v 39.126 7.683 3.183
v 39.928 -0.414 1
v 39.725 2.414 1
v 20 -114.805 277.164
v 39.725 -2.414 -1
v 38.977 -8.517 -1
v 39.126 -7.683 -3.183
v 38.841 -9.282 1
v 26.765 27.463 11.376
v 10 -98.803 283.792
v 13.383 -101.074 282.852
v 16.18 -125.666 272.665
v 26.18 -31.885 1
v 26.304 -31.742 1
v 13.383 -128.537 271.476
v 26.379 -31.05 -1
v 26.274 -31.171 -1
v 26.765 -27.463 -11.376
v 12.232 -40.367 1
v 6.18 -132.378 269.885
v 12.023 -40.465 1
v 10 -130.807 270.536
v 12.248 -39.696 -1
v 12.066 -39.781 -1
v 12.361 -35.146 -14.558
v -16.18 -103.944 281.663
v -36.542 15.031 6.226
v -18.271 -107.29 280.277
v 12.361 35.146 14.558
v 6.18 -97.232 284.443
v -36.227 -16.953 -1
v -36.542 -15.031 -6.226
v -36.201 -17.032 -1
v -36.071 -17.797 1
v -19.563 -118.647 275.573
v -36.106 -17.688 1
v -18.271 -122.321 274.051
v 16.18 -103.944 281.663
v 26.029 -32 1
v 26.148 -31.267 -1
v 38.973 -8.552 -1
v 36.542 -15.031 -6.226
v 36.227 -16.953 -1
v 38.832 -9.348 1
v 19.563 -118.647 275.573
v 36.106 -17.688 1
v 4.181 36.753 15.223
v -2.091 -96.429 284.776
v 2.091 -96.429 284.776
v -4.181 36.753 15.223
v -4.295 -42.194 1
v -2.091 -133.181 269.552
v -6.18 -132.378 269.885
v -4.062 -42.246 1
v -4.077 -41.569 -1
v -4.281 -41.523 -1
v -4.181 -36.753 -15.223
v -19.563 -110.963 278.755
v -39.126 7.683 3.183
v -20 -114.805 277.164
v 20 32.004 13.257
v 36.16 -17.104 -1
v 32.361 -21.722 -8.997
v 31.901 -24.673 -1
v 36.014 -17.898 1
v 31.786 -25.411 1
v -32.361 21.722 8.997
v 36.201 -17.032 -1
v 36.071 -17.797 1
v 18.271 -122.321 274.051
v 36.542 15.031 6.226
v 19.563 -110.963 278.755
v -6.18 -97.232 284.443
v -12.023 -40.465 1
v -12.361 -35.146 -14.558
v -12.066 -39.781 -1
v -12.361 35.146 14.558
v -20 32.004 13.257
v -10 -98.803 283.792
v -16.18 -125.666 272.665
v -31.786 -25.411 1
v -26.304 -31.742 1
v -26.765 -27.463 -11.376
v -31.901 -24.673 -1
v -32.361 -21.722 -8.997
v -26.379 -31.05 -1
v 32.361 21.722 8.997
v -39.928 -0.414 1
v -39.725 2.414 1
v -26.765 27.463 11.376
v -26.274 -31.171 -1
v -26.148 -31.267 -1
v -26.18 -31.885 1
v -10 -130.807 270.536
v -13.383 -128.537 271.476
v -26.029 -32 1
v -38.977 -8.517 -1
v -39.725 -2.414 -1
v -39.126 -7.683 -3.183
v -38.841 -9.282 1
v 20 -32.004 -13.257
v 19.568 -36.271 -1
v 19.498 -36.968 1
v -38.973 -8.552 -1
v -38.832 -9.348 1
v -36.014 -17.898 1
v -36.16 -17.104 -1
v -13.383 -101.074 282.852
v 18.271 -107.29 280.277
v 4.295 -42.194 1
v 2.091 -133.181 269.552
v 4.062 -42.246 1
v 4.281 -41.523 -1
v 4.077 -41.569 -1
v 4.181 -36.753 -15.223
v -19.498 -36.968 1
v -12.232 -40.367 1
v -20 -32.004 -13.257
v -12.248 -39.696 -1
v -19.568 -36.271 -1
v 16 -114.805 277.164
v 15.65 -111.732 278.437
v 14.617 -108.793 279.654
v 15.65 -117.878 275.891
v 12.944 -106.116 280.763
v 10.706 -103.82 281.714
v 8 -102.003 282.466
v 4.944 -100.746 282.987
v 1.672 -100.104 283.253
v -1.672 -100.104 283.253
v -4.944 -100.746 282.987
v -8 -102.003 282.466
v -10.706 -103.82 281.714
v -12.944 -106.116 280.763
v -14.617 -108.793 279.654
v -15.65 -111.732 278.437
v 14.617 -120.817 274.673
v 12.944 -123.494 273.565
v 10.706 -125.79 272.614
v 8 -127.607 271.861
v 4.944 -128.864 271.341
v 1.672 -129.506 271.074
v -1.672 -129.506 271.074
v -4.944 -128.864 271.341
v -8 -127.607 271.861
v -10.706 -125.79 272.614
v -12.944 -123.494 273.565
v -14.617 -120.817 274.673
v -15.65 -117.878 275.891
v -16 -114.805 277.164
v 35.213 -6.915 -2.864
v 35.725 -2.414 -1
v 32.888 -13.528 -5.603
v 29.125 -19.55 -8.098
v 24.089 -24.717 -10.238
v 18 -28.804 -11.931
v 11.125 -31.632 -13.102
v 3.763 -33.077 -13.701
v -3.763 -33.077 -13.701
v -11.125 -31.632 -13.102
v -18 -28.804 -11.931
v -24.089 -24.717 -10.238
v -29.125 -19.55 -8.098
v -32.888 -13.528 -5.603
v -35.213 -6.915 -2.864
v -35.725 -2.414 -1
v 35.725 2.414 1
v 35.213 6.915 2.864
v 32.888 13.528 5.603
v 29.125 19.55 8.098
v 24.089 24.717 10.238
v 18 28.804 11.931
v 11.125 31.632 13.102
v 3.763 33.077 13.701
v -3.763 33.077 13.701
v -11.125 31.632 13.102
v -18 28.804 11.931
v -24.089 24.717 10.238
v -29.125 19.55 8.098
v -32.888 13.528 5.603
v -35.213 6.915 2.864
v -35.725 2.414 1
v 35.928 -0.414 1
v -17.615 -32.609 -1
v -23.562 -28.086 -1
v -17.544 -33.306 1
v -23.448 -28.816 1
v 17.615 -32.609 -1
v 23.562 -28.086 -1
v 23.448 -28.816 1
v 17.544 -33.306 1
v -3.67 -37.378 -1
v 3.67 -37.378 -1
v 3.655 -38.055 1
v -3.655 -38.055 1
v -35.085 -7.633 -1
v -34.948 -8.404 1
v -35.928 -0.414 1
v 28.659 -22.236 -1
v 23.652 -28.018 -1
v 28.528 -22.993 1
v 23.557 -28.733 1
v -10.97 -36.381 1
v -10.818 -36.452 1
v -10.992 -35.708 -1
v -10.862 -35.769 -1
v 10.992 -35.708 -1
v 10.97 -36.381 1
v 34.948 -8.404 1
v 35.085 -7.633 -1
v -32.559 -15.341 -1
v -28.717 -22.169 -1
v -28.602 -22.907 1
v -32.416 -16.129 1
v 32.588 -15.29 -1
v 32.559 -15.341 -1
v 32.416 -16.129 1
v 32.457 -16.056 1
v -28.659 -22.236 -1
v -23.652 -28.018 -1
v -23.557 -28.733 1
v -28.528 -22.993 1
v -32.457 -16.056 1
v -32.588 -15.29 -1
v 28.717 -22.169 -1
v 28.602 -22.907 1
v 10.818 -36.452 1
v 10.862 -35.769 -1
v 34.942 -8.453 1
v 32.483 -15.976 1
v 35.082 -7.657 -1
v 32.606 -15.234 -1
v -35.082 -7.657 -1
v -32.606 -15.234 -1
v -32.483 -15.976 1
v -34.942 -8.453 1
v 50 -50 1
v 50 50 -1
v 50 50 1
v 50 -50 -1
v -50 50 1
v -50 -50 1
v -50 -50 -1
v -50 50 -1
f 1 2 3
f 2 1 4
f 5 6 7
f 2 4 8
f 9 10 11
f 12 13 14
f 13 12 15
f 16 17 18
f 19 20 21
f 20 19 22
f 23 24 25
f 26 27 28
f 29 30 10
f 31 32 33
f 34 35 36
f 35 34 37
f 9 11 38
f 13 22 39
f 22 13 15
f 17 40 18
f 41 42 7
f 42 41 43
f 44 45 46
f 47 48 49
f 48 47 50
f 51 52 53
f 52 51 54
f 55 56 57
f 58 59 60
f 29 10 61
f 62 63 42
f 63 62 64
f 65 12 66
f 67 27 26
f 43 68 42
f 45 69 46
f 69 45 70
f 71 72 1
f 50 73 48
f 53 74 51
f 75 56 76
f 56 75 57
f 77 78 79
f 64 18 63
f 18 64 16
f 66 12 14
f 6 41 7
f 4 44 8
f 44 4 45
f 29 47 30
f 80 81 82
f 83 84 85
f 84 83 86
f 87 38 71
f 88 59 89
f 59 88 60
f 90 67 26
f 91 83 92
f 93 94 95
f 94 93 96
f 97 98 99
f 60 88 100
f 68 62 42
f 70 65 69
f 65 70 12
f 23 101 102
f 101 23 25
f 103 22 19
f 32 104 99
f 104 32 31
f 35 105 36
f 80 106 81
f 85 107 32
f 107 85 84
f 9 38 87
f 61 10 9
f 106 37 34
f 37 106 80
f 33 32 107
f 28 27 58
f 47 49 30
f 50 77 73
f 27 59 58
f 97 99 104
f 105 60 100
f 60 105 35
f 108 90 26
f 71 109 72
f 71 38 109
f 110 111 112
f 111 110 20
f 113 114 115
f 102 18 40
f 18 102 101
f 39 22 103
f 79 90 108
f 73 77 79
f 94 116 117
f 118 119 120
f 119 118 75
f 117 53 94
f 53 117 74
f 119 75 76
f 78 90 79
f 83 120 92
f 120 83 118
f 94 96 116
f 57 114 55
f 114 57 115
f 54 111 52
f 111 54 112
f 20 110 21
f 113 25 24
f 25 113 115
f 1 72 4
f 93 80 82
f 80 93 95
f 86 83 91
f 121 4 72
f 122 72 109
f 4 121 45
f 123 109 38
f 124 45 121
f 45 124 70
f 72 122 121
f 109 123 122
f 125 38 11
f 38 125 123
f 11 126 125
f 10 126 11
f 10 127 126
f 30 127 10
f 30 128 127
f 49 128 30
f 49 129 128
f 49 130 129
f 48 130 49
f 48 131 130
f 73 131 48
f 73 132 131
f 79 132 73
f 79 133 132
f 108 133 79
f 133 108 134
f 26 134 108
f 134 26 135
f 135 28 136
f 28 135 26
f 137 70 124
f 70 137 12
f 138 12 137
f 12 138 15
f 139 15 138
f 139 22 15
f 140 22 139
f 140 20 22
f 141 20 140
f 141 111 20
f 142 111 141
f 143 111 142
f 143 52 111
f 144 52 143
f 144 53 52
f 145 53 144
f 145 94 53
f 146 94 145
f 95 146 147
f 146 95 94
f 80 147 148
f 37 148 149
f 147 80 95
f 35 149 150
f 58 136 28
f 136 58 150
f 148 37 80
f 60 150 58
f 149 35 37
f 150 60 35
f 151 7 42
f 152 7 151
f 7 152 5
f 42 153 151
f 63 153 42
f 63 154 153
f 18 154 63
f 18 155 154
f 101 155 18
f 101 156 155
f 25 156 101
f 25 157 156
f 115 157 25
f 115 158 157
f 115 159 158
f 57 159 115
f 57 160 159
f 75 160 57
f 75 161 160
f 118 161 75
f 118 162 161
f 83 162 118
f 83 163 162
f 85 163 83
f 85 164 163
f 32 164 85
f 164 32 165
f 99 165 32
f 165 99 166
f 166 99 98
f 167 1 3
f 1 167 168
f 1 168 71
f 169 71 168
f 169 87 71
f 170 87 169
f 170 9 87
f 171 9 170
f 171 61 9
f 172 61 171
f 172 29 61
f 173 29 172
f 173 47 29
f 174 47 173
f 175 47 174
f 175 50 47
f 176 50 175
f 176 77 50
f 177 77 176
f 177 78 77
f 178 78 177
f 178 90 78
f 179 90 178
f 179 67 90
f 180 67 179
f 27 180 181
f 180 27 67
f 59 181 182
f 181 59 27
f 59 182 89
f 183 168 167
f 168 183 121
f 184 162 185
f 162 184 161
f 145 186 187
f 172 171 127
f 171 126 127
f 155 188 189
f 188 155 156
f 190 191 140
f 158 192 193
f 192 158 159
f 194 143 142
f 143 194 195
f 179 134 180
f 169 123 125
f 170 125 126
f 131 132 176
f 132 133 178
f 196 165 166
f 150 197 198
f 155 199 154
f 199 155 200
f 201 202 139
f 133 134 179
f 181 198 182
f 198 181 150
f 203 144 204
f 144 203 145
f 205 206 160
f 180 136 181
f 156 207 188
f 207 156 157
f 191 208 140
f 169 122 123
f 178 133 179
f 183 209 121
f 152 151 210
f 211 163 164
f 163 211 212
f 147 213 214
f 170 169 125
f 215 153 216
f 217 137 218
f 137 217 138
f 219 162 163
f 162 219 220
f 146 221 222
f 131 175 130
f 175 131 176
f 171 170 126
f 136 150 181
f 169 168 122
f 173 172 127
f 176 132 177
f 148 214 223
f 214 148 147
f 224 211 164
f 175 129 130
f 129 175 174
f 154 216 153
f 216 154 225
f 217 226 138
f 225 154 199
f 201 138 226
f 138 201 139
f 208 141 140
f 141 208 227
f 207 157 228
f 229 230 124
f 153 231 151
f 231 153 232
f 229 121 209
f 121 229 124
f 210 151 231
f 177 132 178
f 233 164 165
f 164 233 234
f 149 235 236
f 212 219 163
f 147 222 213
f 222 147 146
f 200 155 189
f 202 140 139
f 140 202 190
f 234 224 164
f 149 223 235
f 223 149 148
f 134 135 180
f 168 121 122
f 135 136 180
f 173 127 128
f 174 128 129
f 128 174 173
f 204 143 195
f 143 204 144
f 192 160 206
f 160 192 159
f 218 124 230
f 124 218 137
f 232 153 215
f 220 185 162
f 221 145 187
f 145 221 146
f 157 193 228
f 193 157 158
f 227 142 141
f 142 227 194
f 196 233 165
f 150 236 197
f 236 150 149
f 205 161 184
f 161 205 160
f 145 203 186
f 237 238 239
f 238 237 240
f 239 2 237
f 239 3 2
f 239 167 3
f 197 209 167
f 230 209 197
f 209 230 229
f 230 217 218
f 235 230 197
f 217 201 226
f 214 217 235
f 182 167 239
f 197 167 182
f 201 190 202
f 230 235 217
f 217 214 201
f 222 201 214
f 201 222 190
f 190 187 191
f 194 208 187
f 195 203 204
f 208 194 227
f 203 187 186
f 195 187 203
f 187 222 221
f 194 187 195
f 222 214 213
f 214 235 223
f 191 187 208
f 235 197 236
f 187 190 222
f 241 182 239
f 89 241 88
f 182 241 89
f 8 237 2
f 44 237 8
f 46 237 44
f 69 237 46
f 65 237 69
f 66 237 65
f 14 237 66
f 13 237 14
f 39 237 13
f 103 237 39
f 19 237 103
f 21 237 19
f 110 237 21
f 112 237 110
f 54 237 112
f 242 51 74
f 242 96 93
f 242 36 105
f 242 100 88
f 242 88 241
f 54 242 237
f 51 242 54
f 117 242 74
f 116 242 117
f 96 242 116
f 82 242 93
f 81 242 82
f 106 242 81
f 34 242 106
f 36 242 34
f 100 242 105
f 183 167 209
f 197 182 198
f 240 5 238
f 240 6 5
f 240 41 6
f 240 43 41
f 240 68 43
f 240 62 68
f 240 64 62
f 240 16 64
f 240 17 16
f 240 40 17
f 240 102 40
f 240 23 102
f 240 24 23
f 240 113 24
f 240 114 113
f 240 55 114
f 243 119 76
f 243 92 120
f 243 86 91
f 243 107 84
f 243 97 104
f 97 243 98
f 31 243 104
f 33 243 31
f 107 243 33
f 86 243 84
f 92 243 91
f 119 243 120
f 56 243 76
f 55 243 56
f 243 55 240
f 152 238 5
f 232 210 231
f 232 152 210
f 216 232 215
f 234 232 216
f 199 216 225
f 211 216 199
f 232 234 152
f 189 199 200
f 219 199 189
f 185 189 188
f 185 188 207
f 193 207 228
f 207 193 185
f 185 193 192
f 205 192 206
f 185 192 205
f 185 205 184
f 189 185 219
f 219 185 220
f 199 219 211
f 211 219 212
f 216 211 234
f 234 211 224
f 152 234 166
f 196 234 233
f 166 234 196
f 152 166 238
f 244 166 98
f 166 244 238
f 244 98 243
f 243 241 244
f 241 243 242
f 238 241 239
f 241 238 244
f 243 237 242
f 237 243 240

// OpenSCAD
// file: schnecke.scad
//
// raimund-the-juicer
//
// schnecke part
//
// Copyright (c) 2020 Michael Binz
//

use <lib/spiral.scad>

/**
 *
 */
module schnecke( 
    h=100,
    r1=50,
    r2=20,
    resolution=50 )
{
    union()
    {
        stomp( 
            h=h, 
            stompHeight=5,
            r1=21,
            r2=10 );
        
        difference()
        {
            cylinder( r1=r1, r2=r2, h=h );

            translate( [0,0,h/2])
            spiralSimple(
                height=h,
                Radius=30,
                baseRadius=20,
                frequency=4,
                resolution=50
            );
        }
    }
}

/**
 * A cylinder stomp.  Creates a cylinder and limits this to
 * stompHeight.
 */
module stomp( h, stompHeight, r1, r2 )
{
    d = max( r1, r2 ) * 2;
    
    difference()
    {
        cylinder( r1=r1, r2=r2, h=h );
        
        translate( [0,0,(h/2)+stompHeight] )
            cube( [d,d,h], center = true  );
    }
}
// main file
//
// raimund-the-juicer
//
// welle top-level part
//
// Copyright (c) 2020 Michael Binz
//

use <schnecke.scad>
use <lib/threads.scad>

platte();

module platte()
{
    cornerRadius = 10;
    length = 50;
    width = 80;
    height = 2;

    OVERLAP = 0.001;

    d_top = 80;
    d_bottom = 40;
    // Height
    h0 = 300;
    // Angle
    angle=22.5;
    thickness = 2;
    

    cube([d_top+20,d_top+20,thickness], center=true);
     
    rotate ([angle,0,0]) {
    translate( [0, 0, 0] )
    {
        
        difference () {
            cylinder( 
                r1=d_top/2,
                r2=d_bottom/2,
                h=h0 );
            cylinder( 
                r1=(d_top/2)-(2*thickness),
                r2=(d_bottom/2)-(2*thickness),
                h=h0 );
        }
    }
    }
}
